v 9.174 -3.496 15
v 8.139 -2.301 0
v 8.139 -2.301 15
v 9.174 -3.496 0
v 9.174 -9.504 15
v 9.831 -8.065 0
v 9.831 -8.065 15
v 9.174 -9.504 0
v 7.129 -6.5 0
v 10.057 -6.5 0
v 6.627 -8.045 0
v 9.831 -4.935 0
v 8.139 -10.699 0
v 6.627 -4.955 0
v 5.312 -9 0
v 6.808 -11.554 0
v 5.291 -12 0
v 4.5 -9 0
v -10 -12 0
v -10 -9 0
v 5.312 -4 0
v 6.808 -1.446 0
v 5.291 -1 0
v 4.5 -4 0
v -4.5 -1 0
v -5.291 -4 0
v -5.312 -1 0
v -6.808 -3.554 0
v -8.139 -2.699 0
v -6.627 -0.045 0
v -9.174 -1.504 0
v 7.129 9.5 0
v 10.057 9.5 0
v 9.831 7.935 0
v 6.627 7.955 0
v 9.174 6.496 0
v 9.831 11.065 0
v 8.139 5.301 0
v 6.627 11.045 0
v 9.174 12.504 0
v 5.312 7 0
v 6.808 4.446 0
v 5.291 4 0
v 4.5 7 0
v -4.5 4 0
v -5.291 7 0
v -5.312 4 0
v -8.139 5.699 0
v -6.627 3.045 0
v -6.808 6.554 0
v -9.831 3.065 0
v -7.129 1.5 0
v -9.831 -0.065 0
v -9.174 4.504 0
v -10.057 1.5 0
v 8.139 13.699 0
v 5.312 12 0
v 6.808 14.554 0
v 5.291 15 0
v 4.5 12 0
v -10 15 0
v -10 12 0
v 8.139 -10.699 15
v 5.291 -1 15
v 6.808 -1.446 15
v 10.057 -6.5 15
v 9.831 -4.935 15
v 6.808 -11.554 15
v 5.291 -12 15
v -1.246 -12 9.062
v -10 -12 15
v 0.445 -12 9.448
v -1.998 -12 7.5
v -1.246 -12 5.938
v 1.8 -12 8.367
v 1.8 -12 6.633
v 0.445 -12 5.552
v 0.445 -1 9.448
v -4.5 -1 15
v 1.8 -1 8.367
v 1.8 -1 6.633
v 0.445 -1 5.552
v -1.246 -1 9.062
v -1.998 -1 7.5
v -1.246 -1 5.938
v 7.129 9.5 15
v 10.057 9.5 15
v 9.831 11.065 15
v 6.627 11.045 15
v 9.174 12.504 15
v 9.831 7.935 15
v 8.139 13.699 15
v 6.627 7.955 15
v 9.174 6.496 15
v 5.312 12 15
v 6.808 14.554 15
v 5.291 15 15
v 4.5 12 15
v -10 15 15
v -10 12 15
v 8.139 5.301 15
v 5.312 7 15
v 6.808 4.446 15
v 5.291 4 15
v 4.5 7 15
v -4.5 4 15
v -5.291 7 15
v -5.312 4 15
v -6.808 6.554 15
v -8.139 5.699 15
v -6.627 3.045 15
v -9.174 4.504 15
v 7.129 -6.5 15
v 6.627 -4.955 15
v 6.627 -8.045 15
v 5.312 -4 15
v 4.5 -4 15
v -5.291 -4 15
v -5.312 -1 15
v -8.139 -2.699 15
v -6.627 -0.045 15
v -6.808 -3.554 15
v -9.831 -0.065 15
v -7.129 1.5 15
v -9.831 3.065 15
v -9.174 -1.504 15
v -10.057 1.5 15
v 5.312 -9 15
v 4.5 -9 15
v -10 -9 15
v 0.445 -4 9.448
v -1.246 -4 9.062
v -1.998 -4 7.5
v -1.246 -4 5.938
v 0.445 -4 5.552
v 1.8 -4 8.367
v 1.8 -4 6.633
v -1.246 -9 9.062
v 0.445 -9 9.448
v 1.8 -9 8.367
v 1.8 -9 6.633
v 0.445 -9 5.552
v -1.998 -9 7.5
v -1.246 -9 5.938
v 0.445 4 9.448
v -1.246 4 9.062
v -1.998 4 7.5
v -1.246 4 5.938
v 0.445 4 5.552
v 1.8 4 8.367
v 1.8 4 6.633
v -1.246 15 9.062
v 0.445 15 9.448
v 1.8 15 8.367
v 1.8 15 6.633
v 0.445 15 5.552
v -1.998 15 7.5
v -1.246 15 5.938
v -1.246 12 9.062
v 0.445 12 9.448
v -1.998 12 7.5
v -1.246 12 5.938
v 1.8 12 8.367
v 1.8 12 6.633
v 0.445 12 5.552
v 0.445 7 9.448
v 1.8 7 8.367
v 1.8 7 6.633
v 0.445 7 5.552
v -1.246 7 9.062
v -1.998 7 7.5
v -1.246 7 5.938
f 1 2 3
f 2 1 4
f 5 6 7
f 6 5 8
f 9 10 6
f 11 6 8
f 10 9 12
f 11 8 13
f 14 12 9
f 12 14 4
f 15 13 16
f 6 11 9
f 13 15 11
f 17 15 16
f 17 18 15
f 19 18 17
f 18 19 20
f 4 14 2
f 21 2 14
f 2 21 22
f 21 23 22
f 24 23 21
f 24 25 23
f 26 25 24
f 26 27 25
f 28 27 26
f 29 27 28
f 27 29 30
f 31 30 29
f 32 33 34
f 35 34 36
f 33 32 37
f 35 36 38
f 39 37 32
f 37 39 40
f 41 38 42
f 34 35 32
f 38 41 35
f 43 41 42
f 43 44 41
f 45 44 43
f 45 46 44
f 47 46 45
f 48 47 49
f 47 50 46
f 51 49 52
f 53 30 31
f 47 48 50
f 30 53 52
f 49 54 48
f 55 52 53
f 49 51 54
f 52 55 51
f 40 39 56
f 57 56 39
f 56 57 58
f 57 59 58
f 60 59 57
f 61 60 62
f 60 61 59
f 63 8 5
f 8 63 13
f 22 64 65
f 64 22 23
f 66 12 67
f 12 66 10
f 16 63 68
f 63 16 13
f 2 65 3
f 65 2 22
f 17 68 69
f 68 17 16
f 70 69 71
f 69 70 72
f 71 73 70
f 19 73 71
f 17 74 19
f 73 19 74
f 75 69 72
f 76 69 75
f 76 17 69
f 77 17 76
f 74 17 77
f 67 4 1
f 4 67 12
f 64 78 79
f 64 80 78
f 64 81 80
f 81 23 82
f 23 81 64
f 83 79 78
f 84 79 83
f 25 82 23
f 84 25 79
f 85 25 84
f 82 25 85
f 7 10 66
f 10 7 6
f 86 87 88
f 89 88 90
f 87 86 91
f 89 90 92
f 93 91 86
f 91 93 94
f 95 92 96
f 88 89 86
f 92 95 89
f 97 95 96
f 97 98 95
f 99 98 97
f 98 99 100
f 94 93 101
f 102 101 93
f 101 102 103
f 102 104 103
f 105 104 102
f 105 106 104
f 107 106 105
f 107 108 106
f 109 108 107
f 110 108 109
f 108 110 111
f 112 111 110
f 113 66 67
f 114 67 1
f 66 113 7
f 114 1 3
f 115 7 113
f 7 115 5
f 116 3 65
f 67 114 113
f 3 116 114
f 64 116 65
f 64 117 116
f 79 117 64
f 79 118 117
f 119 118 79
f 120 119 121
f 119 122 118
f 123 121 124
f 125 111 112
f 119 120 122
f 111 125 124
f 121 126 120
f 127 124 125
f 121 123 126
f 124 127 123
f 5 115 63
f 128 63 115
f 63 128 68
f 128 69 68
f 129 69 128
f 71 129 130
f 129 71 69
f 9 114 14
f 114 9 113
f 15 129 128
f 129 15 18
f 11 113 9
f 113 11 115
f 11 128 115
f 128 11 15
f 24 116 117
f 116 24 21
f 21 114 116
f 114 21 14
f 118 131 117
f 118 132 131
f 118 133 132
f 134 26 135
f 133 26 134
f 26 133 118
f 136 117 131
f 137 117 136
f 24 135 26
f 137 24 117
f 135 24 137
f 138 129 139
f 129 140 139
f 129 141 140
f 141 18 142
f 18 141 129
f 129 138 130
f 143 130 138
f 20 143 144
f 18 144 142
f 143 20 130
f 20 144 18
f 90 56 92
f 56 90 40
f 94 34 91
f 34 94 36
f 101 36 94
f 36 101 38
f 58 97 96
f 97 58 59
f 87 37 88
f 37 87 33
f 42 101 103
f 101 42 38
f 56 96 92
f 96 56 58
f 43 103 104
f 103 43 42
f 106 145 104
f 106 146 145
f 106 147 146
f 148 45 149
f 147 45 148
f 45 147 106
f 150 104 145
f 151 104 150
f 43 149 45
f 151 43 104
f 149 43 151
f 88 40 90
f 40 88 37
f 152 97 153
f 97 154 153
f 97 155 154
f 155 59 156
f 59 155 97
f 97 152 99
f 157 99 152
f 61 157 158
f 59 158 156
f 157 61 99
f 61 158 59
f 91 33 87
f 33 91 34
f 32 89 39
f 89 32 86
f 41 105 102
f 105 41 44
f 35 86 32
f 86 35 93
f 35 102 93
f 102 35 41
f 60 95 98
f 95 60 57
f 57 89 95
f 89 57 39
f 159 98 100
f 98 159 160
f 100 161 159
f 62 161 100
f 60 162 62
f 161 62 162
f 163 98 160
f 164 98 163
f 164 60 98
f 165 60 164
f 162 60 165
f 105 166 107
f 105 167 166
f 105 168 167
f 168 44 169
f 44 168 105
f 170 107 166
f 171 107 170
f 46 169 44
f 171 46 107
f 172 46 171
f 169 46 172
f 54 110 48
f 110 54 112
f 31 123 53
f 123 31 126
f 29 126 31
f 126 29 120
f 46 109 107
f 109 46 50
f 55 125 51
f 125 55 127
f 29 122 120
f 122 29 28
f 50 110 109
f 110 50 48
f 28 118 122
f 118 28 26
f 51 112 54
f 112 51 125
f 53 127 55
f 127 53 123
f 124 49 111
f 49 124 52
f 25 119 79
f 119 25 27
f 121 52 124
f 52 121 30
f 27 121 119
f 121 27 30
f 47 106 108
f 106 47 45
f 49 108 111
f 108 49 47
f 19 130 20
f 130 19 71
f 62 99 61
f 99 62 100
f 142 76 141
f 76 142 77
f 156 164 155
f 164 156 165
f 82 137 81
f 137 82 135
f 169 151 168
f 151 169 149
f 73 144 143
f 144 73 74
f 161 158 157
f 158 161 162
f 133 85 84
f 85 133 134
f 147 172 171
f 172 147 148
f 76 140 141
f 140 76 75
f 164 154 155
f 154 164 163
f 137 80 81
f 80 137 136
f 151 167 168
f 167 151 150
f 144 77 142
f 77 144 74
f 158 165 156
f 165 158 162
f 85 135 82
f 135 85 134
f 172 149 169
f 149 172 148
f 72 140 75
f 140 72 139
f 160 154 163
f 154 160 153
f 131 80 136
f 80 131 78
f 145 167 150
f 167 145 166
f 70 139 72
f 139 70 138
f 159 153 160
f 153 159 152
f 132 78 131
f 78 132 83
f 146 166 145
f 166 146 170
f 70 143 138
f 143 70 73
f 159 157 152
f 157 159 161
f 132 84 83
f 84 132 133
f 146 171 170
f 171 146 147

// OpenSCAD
// file: functions.scad
// PRUSA Mendel  
// Functions used in many files
// GNU GPL v2
// Josef Průša
// josefprusa@me.com
// prusadjs.cz
// http://www.reprap.org/wiki/Prusa_Mendel
// http://github.com/prusajr/PrusaMendel

module nut( d, h, horizontal = true )
{
	cornerradius = nutcornerdiameter(d)/2;
	cylinder( h = h, r = cornerradius, $fn = 6 );
	if( horizontal )
	{
		for( i = [1 : 6] )
		{
			rotate( [0, 0, 60 * i] ) translate( [-cornerradius - 0.2, 0, 0] ) rotate( [0, 0, -45] ) cube( size = [2, 2, h] );
		}
	}
}

// By nophead
module polyhole( d, h ) 
{
	n = max( round( 2 * d ), 3 );
	rotate( [0, 0, 180] ) cylinder( h = h, r = ( d / 2 ) / cos( 180 / n ), $fn = n );
}

module roundcorner( diameter )
{
	difference()
	{
		cube( size = [diameter, diameter, 99], center = false );
		translate( v = [diameter, diameter, 0] ) cylinder( h = 100, r = diameter, center = true );
	}
}

function nutcornerdiameter(d) = ( d ) / cos( 180 / 6 );
// file: metric.scad
// PRUSA Mendel  
// Default metric sizes
// GNU GPL v2
// Josef Průša
// josefprusa@me.com
// prusadjs.cz
// http://www.reprap.org/wiki/Prusa_Mendel
// http://github.com/prusajr/PrusaMendel

// DONT CHANGE THIS FILE! ALTER VALUES IN CONFIGURATION.SCAD INSTEAD

// RODS

threaded_rod_diameter = 8.2;
threaded_rod_diameter_horizontal = 8.2;
smooth_bar_diameter = 8;
smooth_bar_diameter_horizontal = 8.5;

// Nuts and bolts

m8_diameter = 9;
m8_nut_diameter = 16.4;

m4_diameter = 4.5;
m4_nut_diameter = 9;

m3_diameter = 3.6;
m3_nut_diameter = 6.1;

// Bushing holder

bushing_core_diameter = smooth_bar_diameter;
bushing_material_thickness = 1;

// Motors

motor_shaft = 5.5;
// file: configuration.scad
// PRUSA Mendel  
// Configuration file
// GNU GPL v2
// Josef Průša
// josefprusa@me.com
// prusadjs.cz
// http://www.reprap.org/wiki/Prusa_Mendel
// http://github.com/prusajr/PrusaMendel

// PLEASE SELECT ONE OF THE CONFIGURATIONS BELOW
// BY UN-COMMENTING IT

// Uncomment for metric settings
// METRIC METRIC METRIC METRIC METRIC METRIC METRIC METRIC 

include <metric.scad>;

// Uncomment for imperial settings
// IMPERIAL IMPERIAL IMPERIAL IMPERIAL IMPERIAL IMPERIAL IMPERIAL 

//include <sae.scad>;

// CUSTOM CUSTOM CUSTOM CUSTOM CUSTOM CUSTOM CUSTOM CUSTOM CUSTOM

// Thin walls
layer_height = 0.3;
wot = 1.5;
filament_width = layer_height * wot;

thin_wall = 4 * layer_height * wot;

// LM8UU
linear = true;
linear_bearing_diameter = 15;
linear_bearing_length = 24;

//608 bearing
bearing_diameter = 22;
bearing_thickness = 7;

//Timing belt
belt_pitch = 5;

// CHANGE ONLY THE STUFF YOU KNOW
// IT WILL REPLACE DEFAULT SETTING

// RODS

// threaded_rod_diameter = 0;
// threaded_rod_diameter_horizontal = 0;
// smooth_bar_díameter = 0;
// smooth_bar_díameter_horizontal = 0;

// Nuts and bolts

// m8_diameter = 0;
// m8_nut_diameter = 0;
// m8_nut_thickness = 0;

// m4_diameter = 0;
 m4_nut_diameter = 8.5;
// m4_nut_thickness = 0;

// m3_diameter = 0;
// m3_nut_diameter = 0;
m3_nut_thickness = 3;

// Bushing holder

// bushing_core_diameter = smooth_bar_díameter;
// bushing_material_thickness = 0;

///counted stuff
m3_nut_diameter_bigger = ( ( m3_nut_diameter  / 2) / cos( 180 / 6 ) ) * 2;

// functions 
include <functions.scad>
// main file
//---------------------------------------------------------------------------------------------
//-- Printable parameterized spring
//-- (c) Juan Gonzalez-Gomez (Obijuan) juan@iearobotics.com
//-- April-2012
//---------------------------------------------------------------------------------------------
//-- Proof of concept
//---------------------------------------------------------------------------------------------

include <configuration.scad>;

//-- Spring folds. It is implemented by means of arcs
//-- It consist of two parts: the arc and the arms
//-- r = Inner arc radius
//-- th = thickness
//-- w = width
//-- arc_len = Length of the two arms
module spring_arc(arm_len, r, th, w)
{
  //-- outer radius
  or = r + th; 

  translate([arm_len,or,0])
  union() {

    //-- Arc
    difference() {
      //cylinder(r=or, h=w, center=true, $fn=20);
     translate([0,0,-w/2])polyhole(d=2*or, h=w);

      translate([-or,0,0])
          cube([2*or, 2*or+2, w+2],center=true);

      //cylinder(r=r, h=w+10, center=true, $fn=20);
     translate([0,0,-(w+10)/2])polyhole(d=2*r, h=w+10);

    }

    //-- Arms
    translate([-arm_len/2,th/2+r,0])
      cube([arm_len,th,w],center=true);

    translate([-arm_len/2,-th/2-r,0])
      cube([arm_len,th,w],center=true);
  }
}

//---------------------------------------------------------
//-- This module creates the spring, with a square section
//-- and no drills
//-- Spring parameters:
//--  -fid: Fold inner diameter
//--  -th: thickness 
//--  -folds: Number of folds: starting from 1
//--  -lx,lz: Spring length on x and z axes respectively
//--------------------------------------------------------
module parametric_spring_common(fid=3, th=2, folds=8, lx=20, lz=20)
{

  step = 2*(fid + th);
  arm_len = (lx - fid - 2*th)/2;
  ly = folds*step/2;

  translate([0,-ly/2,0])
  union() {

    //-- Right folds
    for (i=[1:ceil(folds/2)]) {
      translate([0, (i-1)*step,0])
        spring_arc(arm_len=arm_len, r=fid/2, th=th, w=lz);
    }

    //-- left folds
    if (folds>1) {
      for (i=[1:floor(folds/2)]) {
        translate([0, (i-0.5)*step,0])
          mirror([1,0,0])
          spring_arc(arm_len=arm_len, r=fid/2, th=th, w=lz);
      }
    }

    translate([-lx/4,th/2,0])
      cube([lx/2,th,lz], center=true);

    if ((folds%2)==0)
      translate([lx/4, th/2+(step/2)*folds,0])
        cube([lx/2,th,lz], center=true);
    else
      translate([-lx/4, th/2+(step/2)*folds,0])
        cube([lx/2,th,lz], center=true);
  }
}

module teardrop(r,h)
{
  $fa=15.0;
  $fs=0.1;

  diameter=2*r;

  translate([0,0,-h/2])
  linear_extrude(height=h, center=false, convexity=10)
  difference() {
    union() {
      circle(r=diameter/2);
      rotate(45) square(size=diameter/2,center=false);
    }
    translate([-diameter/2,diameter/2]) square(size=diameter);
  }
}

module pipe(hexa_diam=12, len=5, offs=0, sides=6)
{
  out_diam = 4*(hexa_diam/2 * cos(360/(2*sides)));


  difference() {
    rotate([90,0,0])
     cylinder(r=out_diam/2, h=len+10,center=true, $fn=sides);

    rotate([90,0,0])
     cylinder(r=hexa_diam/2+offs, h=len+15,center=true, $fn=sides);
  }
}

//---------------------------------------------
//-- Spring MAIN MODULES!
//-- Common parameters:
//--     -fid = folder inner diameter
//--     -th = thickness
//--     -folds = Number of folds in the spring
//--     -drill = Inner drill
//---------------------------------------------


//-------------------------------------
//-- Spring with a square section
//-- Specific parameters:
//--    lx, lz : square lenths
//-------------------------------------
module spring_square(fid=3, th=2, folds=8, lx=20, lz=20,drill=8)
{
  step = 2*(fid + th);
  arm_len = (lx - fid - 2*th)/2;
  ly = folds*fid + (folds+1)*th;
  echo(ly);

  difference() {
    parametric_spring_common(fid=fid,th=th, folds=folds, lx=lx, lz=lz);

    rotate([90,0,0])
      //teardrop(r=drill/2,h=ly+10);
      //cylinder(r=drill/2, h=ly+10, center=true, $fn=20);
     translate([0,0,-(ly+10)/2]) polyhole(d=drill, h=ly+10);
  }
}

//-----------------------------------------------------------------------
//-- Spring with an hexagonal section 
//-- Specific parameters:
//--    hexa_diam: external diameter
//--    offs: Additional distance added to the hexa_diam to 
//--      for changing the shape. When offs=0, it is a regular hexagon
//----------------------------------------------------------------------
module spring_hexagonal(fid=3, th=2, folds=8, hexa_diam=13 ,drill=8,offs=0)
{
   ly = folds*(fid + th);
  lx = hexa_diam;
  lz = 2*(hexa_diam/2 * cos(30));
  step = 2*(fid + th);
  arm_len = (lx - fid - 2*th)/2;
 

  difference() {
    parametric_spring_common(fid=fid,th=th, folds=folds, lx=lx, lz=lz);

    rotate([90,0,0])
      //cylinder(r=drill/2, h=ly+10, center=true, $fn=20);
      teardrop(r=drill/2,h=ly+10);

    pipe(hexa_diam=hexa_diam, len=ly,offs=offs,sides=6);
  }
}


//-----------------------------------------------------------------------
//-- Spring with an octogonal section 
//-- Specific parameters:
//--    hexa_diam: external diameter
//--    offs: Additional distance added to the hexa_diam to 
//--      for changing the shape. When offs=0, it is a regular hexagon
//----------------------------------------------------------------------
module spring_octogonal(fid=3, th=2, folds=8, hexa_diam=13 ,drill=8,offs=0)
{
   ly = folds*(fid + th);
  lx = hexa_diam;
  lz = 2*(hexa_diam/2 * cos(30));
  step = 2*(fid + th);
  arm_len = (lx - fid - 2*th)/2;
  echo(ly);

  difference() {
    parametric_spring_common(fid=fid,th=th, folds=folds, lx=lx, lz=lz);

    rotate([90,0,0])
      //cylinder(r=drill/2, h=ly+10, center=true, $fn=20);
      teardrop(r=drill/2,h=ly+10);

    rotate([0,45/2,0])
    pipe(hexa_diam=hexa_diam, len=ly,offs=offs, sides=8);
  }
}

//-- Example springs!

lx=20;
ly=27;
lz=15;
folds=3;
th=3;
drill=m3_diameter;
fid=(ly-(folds+1)*th)/folds;

translate([0,0,lz/2])
spring_square(fid=fid, th=th, folds=folds, lx=lx, lz=lz, drill=drill);

//-- This is the one used as a z axis spring on the Prusa Mendel
//translate([0,0,0])
//spring_hexagonal(fid=3, th=2, folds=4, hexa_diam=14.6, drill=8, offs=0);

//translate([30,0,0])
//spring_octogonal(fid=4, th=2, folds=6, hexa_diam=22, drill=14);
